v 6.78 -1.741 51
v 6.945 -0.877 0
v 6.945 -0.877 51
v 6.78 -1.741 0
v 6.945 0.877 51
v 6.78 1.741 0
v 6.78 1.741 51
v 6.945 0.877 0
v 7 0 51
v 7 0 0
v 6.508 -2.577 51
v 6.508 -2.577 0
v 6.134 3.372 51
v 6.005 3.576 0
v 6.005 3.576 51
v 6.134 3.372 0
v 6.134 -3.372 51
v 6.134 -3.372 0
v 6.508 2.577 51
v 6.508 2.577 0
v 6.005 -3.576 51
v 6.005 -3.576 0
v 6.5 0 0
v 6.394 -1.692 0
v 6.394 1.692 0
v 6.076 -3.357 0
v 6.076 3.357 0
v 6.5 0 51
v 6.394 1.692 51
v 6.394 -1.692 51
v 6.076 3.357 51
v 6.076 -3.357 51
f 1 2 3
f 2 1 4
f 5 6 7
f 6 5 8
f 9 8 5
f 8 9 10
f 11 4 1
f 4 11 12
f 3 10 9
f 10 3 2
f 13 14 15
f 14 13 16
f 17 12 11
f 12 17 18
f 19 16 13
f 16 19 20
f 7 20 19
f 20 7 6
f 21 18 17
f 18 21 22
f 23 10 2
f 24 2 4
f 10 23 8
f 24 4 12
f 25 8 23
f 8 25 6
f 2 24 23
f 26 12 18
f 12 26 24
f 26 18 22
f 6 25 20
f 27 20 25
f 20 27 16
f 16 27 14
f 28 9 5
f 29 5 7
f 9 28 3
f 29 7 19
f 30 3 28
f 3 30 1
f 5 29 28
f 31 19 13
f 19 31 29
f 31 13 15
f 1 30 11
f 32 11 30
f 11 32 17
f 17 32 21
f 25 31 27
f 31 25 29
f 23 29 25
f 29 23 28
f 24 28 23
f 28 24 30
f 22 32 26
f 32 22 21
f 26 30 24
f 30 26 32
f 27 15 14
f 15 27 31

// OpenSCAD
$fn = 50;


difference() {
	union() {
		cylinder(h = 51, r = 7.0000000000);
		translate(v = [-10.0000000000, 0, 0]) {
			cylinder(h = 51, r = 7.0000000000);
		}
	}
	union() {
		cylinder(h = 51, r = 3.2500000000);
		cylinder(h = 51, r = 1.8000000000);
		cylinder(h = 51, r = 1.8000000000);
		cylinder(h = 51, r = 1.8000000000);
		translate(v = [-14.5000000000, 0, 0]) {
			hull() {
				translate(v = [-3.7500000000, 0.0000000000, 0]) {
					cylinder(h = 51, r = 10.5000000000);
				}
				translate(v = [3.7500000000, 0.0000000000, 0]) {
					cylinder(h = 51, r = 10.5000000000);
				}
				translate(v = [-3.7500000000, -0.0000000000, 0]) {
					cylinder(h = 51, r = 10.5000000000);
				}
				translate(v = [3.7500000000, -0.0000000000, 0]) {
					cylinder(h = 51, r = 10.5000000000);
				}
			}
		}
		translate(v = [-7.0000000000, 0, 0.0000000000]) {
			cylinder(h = 51, r = 13.5000000000);
		}
	}
}
